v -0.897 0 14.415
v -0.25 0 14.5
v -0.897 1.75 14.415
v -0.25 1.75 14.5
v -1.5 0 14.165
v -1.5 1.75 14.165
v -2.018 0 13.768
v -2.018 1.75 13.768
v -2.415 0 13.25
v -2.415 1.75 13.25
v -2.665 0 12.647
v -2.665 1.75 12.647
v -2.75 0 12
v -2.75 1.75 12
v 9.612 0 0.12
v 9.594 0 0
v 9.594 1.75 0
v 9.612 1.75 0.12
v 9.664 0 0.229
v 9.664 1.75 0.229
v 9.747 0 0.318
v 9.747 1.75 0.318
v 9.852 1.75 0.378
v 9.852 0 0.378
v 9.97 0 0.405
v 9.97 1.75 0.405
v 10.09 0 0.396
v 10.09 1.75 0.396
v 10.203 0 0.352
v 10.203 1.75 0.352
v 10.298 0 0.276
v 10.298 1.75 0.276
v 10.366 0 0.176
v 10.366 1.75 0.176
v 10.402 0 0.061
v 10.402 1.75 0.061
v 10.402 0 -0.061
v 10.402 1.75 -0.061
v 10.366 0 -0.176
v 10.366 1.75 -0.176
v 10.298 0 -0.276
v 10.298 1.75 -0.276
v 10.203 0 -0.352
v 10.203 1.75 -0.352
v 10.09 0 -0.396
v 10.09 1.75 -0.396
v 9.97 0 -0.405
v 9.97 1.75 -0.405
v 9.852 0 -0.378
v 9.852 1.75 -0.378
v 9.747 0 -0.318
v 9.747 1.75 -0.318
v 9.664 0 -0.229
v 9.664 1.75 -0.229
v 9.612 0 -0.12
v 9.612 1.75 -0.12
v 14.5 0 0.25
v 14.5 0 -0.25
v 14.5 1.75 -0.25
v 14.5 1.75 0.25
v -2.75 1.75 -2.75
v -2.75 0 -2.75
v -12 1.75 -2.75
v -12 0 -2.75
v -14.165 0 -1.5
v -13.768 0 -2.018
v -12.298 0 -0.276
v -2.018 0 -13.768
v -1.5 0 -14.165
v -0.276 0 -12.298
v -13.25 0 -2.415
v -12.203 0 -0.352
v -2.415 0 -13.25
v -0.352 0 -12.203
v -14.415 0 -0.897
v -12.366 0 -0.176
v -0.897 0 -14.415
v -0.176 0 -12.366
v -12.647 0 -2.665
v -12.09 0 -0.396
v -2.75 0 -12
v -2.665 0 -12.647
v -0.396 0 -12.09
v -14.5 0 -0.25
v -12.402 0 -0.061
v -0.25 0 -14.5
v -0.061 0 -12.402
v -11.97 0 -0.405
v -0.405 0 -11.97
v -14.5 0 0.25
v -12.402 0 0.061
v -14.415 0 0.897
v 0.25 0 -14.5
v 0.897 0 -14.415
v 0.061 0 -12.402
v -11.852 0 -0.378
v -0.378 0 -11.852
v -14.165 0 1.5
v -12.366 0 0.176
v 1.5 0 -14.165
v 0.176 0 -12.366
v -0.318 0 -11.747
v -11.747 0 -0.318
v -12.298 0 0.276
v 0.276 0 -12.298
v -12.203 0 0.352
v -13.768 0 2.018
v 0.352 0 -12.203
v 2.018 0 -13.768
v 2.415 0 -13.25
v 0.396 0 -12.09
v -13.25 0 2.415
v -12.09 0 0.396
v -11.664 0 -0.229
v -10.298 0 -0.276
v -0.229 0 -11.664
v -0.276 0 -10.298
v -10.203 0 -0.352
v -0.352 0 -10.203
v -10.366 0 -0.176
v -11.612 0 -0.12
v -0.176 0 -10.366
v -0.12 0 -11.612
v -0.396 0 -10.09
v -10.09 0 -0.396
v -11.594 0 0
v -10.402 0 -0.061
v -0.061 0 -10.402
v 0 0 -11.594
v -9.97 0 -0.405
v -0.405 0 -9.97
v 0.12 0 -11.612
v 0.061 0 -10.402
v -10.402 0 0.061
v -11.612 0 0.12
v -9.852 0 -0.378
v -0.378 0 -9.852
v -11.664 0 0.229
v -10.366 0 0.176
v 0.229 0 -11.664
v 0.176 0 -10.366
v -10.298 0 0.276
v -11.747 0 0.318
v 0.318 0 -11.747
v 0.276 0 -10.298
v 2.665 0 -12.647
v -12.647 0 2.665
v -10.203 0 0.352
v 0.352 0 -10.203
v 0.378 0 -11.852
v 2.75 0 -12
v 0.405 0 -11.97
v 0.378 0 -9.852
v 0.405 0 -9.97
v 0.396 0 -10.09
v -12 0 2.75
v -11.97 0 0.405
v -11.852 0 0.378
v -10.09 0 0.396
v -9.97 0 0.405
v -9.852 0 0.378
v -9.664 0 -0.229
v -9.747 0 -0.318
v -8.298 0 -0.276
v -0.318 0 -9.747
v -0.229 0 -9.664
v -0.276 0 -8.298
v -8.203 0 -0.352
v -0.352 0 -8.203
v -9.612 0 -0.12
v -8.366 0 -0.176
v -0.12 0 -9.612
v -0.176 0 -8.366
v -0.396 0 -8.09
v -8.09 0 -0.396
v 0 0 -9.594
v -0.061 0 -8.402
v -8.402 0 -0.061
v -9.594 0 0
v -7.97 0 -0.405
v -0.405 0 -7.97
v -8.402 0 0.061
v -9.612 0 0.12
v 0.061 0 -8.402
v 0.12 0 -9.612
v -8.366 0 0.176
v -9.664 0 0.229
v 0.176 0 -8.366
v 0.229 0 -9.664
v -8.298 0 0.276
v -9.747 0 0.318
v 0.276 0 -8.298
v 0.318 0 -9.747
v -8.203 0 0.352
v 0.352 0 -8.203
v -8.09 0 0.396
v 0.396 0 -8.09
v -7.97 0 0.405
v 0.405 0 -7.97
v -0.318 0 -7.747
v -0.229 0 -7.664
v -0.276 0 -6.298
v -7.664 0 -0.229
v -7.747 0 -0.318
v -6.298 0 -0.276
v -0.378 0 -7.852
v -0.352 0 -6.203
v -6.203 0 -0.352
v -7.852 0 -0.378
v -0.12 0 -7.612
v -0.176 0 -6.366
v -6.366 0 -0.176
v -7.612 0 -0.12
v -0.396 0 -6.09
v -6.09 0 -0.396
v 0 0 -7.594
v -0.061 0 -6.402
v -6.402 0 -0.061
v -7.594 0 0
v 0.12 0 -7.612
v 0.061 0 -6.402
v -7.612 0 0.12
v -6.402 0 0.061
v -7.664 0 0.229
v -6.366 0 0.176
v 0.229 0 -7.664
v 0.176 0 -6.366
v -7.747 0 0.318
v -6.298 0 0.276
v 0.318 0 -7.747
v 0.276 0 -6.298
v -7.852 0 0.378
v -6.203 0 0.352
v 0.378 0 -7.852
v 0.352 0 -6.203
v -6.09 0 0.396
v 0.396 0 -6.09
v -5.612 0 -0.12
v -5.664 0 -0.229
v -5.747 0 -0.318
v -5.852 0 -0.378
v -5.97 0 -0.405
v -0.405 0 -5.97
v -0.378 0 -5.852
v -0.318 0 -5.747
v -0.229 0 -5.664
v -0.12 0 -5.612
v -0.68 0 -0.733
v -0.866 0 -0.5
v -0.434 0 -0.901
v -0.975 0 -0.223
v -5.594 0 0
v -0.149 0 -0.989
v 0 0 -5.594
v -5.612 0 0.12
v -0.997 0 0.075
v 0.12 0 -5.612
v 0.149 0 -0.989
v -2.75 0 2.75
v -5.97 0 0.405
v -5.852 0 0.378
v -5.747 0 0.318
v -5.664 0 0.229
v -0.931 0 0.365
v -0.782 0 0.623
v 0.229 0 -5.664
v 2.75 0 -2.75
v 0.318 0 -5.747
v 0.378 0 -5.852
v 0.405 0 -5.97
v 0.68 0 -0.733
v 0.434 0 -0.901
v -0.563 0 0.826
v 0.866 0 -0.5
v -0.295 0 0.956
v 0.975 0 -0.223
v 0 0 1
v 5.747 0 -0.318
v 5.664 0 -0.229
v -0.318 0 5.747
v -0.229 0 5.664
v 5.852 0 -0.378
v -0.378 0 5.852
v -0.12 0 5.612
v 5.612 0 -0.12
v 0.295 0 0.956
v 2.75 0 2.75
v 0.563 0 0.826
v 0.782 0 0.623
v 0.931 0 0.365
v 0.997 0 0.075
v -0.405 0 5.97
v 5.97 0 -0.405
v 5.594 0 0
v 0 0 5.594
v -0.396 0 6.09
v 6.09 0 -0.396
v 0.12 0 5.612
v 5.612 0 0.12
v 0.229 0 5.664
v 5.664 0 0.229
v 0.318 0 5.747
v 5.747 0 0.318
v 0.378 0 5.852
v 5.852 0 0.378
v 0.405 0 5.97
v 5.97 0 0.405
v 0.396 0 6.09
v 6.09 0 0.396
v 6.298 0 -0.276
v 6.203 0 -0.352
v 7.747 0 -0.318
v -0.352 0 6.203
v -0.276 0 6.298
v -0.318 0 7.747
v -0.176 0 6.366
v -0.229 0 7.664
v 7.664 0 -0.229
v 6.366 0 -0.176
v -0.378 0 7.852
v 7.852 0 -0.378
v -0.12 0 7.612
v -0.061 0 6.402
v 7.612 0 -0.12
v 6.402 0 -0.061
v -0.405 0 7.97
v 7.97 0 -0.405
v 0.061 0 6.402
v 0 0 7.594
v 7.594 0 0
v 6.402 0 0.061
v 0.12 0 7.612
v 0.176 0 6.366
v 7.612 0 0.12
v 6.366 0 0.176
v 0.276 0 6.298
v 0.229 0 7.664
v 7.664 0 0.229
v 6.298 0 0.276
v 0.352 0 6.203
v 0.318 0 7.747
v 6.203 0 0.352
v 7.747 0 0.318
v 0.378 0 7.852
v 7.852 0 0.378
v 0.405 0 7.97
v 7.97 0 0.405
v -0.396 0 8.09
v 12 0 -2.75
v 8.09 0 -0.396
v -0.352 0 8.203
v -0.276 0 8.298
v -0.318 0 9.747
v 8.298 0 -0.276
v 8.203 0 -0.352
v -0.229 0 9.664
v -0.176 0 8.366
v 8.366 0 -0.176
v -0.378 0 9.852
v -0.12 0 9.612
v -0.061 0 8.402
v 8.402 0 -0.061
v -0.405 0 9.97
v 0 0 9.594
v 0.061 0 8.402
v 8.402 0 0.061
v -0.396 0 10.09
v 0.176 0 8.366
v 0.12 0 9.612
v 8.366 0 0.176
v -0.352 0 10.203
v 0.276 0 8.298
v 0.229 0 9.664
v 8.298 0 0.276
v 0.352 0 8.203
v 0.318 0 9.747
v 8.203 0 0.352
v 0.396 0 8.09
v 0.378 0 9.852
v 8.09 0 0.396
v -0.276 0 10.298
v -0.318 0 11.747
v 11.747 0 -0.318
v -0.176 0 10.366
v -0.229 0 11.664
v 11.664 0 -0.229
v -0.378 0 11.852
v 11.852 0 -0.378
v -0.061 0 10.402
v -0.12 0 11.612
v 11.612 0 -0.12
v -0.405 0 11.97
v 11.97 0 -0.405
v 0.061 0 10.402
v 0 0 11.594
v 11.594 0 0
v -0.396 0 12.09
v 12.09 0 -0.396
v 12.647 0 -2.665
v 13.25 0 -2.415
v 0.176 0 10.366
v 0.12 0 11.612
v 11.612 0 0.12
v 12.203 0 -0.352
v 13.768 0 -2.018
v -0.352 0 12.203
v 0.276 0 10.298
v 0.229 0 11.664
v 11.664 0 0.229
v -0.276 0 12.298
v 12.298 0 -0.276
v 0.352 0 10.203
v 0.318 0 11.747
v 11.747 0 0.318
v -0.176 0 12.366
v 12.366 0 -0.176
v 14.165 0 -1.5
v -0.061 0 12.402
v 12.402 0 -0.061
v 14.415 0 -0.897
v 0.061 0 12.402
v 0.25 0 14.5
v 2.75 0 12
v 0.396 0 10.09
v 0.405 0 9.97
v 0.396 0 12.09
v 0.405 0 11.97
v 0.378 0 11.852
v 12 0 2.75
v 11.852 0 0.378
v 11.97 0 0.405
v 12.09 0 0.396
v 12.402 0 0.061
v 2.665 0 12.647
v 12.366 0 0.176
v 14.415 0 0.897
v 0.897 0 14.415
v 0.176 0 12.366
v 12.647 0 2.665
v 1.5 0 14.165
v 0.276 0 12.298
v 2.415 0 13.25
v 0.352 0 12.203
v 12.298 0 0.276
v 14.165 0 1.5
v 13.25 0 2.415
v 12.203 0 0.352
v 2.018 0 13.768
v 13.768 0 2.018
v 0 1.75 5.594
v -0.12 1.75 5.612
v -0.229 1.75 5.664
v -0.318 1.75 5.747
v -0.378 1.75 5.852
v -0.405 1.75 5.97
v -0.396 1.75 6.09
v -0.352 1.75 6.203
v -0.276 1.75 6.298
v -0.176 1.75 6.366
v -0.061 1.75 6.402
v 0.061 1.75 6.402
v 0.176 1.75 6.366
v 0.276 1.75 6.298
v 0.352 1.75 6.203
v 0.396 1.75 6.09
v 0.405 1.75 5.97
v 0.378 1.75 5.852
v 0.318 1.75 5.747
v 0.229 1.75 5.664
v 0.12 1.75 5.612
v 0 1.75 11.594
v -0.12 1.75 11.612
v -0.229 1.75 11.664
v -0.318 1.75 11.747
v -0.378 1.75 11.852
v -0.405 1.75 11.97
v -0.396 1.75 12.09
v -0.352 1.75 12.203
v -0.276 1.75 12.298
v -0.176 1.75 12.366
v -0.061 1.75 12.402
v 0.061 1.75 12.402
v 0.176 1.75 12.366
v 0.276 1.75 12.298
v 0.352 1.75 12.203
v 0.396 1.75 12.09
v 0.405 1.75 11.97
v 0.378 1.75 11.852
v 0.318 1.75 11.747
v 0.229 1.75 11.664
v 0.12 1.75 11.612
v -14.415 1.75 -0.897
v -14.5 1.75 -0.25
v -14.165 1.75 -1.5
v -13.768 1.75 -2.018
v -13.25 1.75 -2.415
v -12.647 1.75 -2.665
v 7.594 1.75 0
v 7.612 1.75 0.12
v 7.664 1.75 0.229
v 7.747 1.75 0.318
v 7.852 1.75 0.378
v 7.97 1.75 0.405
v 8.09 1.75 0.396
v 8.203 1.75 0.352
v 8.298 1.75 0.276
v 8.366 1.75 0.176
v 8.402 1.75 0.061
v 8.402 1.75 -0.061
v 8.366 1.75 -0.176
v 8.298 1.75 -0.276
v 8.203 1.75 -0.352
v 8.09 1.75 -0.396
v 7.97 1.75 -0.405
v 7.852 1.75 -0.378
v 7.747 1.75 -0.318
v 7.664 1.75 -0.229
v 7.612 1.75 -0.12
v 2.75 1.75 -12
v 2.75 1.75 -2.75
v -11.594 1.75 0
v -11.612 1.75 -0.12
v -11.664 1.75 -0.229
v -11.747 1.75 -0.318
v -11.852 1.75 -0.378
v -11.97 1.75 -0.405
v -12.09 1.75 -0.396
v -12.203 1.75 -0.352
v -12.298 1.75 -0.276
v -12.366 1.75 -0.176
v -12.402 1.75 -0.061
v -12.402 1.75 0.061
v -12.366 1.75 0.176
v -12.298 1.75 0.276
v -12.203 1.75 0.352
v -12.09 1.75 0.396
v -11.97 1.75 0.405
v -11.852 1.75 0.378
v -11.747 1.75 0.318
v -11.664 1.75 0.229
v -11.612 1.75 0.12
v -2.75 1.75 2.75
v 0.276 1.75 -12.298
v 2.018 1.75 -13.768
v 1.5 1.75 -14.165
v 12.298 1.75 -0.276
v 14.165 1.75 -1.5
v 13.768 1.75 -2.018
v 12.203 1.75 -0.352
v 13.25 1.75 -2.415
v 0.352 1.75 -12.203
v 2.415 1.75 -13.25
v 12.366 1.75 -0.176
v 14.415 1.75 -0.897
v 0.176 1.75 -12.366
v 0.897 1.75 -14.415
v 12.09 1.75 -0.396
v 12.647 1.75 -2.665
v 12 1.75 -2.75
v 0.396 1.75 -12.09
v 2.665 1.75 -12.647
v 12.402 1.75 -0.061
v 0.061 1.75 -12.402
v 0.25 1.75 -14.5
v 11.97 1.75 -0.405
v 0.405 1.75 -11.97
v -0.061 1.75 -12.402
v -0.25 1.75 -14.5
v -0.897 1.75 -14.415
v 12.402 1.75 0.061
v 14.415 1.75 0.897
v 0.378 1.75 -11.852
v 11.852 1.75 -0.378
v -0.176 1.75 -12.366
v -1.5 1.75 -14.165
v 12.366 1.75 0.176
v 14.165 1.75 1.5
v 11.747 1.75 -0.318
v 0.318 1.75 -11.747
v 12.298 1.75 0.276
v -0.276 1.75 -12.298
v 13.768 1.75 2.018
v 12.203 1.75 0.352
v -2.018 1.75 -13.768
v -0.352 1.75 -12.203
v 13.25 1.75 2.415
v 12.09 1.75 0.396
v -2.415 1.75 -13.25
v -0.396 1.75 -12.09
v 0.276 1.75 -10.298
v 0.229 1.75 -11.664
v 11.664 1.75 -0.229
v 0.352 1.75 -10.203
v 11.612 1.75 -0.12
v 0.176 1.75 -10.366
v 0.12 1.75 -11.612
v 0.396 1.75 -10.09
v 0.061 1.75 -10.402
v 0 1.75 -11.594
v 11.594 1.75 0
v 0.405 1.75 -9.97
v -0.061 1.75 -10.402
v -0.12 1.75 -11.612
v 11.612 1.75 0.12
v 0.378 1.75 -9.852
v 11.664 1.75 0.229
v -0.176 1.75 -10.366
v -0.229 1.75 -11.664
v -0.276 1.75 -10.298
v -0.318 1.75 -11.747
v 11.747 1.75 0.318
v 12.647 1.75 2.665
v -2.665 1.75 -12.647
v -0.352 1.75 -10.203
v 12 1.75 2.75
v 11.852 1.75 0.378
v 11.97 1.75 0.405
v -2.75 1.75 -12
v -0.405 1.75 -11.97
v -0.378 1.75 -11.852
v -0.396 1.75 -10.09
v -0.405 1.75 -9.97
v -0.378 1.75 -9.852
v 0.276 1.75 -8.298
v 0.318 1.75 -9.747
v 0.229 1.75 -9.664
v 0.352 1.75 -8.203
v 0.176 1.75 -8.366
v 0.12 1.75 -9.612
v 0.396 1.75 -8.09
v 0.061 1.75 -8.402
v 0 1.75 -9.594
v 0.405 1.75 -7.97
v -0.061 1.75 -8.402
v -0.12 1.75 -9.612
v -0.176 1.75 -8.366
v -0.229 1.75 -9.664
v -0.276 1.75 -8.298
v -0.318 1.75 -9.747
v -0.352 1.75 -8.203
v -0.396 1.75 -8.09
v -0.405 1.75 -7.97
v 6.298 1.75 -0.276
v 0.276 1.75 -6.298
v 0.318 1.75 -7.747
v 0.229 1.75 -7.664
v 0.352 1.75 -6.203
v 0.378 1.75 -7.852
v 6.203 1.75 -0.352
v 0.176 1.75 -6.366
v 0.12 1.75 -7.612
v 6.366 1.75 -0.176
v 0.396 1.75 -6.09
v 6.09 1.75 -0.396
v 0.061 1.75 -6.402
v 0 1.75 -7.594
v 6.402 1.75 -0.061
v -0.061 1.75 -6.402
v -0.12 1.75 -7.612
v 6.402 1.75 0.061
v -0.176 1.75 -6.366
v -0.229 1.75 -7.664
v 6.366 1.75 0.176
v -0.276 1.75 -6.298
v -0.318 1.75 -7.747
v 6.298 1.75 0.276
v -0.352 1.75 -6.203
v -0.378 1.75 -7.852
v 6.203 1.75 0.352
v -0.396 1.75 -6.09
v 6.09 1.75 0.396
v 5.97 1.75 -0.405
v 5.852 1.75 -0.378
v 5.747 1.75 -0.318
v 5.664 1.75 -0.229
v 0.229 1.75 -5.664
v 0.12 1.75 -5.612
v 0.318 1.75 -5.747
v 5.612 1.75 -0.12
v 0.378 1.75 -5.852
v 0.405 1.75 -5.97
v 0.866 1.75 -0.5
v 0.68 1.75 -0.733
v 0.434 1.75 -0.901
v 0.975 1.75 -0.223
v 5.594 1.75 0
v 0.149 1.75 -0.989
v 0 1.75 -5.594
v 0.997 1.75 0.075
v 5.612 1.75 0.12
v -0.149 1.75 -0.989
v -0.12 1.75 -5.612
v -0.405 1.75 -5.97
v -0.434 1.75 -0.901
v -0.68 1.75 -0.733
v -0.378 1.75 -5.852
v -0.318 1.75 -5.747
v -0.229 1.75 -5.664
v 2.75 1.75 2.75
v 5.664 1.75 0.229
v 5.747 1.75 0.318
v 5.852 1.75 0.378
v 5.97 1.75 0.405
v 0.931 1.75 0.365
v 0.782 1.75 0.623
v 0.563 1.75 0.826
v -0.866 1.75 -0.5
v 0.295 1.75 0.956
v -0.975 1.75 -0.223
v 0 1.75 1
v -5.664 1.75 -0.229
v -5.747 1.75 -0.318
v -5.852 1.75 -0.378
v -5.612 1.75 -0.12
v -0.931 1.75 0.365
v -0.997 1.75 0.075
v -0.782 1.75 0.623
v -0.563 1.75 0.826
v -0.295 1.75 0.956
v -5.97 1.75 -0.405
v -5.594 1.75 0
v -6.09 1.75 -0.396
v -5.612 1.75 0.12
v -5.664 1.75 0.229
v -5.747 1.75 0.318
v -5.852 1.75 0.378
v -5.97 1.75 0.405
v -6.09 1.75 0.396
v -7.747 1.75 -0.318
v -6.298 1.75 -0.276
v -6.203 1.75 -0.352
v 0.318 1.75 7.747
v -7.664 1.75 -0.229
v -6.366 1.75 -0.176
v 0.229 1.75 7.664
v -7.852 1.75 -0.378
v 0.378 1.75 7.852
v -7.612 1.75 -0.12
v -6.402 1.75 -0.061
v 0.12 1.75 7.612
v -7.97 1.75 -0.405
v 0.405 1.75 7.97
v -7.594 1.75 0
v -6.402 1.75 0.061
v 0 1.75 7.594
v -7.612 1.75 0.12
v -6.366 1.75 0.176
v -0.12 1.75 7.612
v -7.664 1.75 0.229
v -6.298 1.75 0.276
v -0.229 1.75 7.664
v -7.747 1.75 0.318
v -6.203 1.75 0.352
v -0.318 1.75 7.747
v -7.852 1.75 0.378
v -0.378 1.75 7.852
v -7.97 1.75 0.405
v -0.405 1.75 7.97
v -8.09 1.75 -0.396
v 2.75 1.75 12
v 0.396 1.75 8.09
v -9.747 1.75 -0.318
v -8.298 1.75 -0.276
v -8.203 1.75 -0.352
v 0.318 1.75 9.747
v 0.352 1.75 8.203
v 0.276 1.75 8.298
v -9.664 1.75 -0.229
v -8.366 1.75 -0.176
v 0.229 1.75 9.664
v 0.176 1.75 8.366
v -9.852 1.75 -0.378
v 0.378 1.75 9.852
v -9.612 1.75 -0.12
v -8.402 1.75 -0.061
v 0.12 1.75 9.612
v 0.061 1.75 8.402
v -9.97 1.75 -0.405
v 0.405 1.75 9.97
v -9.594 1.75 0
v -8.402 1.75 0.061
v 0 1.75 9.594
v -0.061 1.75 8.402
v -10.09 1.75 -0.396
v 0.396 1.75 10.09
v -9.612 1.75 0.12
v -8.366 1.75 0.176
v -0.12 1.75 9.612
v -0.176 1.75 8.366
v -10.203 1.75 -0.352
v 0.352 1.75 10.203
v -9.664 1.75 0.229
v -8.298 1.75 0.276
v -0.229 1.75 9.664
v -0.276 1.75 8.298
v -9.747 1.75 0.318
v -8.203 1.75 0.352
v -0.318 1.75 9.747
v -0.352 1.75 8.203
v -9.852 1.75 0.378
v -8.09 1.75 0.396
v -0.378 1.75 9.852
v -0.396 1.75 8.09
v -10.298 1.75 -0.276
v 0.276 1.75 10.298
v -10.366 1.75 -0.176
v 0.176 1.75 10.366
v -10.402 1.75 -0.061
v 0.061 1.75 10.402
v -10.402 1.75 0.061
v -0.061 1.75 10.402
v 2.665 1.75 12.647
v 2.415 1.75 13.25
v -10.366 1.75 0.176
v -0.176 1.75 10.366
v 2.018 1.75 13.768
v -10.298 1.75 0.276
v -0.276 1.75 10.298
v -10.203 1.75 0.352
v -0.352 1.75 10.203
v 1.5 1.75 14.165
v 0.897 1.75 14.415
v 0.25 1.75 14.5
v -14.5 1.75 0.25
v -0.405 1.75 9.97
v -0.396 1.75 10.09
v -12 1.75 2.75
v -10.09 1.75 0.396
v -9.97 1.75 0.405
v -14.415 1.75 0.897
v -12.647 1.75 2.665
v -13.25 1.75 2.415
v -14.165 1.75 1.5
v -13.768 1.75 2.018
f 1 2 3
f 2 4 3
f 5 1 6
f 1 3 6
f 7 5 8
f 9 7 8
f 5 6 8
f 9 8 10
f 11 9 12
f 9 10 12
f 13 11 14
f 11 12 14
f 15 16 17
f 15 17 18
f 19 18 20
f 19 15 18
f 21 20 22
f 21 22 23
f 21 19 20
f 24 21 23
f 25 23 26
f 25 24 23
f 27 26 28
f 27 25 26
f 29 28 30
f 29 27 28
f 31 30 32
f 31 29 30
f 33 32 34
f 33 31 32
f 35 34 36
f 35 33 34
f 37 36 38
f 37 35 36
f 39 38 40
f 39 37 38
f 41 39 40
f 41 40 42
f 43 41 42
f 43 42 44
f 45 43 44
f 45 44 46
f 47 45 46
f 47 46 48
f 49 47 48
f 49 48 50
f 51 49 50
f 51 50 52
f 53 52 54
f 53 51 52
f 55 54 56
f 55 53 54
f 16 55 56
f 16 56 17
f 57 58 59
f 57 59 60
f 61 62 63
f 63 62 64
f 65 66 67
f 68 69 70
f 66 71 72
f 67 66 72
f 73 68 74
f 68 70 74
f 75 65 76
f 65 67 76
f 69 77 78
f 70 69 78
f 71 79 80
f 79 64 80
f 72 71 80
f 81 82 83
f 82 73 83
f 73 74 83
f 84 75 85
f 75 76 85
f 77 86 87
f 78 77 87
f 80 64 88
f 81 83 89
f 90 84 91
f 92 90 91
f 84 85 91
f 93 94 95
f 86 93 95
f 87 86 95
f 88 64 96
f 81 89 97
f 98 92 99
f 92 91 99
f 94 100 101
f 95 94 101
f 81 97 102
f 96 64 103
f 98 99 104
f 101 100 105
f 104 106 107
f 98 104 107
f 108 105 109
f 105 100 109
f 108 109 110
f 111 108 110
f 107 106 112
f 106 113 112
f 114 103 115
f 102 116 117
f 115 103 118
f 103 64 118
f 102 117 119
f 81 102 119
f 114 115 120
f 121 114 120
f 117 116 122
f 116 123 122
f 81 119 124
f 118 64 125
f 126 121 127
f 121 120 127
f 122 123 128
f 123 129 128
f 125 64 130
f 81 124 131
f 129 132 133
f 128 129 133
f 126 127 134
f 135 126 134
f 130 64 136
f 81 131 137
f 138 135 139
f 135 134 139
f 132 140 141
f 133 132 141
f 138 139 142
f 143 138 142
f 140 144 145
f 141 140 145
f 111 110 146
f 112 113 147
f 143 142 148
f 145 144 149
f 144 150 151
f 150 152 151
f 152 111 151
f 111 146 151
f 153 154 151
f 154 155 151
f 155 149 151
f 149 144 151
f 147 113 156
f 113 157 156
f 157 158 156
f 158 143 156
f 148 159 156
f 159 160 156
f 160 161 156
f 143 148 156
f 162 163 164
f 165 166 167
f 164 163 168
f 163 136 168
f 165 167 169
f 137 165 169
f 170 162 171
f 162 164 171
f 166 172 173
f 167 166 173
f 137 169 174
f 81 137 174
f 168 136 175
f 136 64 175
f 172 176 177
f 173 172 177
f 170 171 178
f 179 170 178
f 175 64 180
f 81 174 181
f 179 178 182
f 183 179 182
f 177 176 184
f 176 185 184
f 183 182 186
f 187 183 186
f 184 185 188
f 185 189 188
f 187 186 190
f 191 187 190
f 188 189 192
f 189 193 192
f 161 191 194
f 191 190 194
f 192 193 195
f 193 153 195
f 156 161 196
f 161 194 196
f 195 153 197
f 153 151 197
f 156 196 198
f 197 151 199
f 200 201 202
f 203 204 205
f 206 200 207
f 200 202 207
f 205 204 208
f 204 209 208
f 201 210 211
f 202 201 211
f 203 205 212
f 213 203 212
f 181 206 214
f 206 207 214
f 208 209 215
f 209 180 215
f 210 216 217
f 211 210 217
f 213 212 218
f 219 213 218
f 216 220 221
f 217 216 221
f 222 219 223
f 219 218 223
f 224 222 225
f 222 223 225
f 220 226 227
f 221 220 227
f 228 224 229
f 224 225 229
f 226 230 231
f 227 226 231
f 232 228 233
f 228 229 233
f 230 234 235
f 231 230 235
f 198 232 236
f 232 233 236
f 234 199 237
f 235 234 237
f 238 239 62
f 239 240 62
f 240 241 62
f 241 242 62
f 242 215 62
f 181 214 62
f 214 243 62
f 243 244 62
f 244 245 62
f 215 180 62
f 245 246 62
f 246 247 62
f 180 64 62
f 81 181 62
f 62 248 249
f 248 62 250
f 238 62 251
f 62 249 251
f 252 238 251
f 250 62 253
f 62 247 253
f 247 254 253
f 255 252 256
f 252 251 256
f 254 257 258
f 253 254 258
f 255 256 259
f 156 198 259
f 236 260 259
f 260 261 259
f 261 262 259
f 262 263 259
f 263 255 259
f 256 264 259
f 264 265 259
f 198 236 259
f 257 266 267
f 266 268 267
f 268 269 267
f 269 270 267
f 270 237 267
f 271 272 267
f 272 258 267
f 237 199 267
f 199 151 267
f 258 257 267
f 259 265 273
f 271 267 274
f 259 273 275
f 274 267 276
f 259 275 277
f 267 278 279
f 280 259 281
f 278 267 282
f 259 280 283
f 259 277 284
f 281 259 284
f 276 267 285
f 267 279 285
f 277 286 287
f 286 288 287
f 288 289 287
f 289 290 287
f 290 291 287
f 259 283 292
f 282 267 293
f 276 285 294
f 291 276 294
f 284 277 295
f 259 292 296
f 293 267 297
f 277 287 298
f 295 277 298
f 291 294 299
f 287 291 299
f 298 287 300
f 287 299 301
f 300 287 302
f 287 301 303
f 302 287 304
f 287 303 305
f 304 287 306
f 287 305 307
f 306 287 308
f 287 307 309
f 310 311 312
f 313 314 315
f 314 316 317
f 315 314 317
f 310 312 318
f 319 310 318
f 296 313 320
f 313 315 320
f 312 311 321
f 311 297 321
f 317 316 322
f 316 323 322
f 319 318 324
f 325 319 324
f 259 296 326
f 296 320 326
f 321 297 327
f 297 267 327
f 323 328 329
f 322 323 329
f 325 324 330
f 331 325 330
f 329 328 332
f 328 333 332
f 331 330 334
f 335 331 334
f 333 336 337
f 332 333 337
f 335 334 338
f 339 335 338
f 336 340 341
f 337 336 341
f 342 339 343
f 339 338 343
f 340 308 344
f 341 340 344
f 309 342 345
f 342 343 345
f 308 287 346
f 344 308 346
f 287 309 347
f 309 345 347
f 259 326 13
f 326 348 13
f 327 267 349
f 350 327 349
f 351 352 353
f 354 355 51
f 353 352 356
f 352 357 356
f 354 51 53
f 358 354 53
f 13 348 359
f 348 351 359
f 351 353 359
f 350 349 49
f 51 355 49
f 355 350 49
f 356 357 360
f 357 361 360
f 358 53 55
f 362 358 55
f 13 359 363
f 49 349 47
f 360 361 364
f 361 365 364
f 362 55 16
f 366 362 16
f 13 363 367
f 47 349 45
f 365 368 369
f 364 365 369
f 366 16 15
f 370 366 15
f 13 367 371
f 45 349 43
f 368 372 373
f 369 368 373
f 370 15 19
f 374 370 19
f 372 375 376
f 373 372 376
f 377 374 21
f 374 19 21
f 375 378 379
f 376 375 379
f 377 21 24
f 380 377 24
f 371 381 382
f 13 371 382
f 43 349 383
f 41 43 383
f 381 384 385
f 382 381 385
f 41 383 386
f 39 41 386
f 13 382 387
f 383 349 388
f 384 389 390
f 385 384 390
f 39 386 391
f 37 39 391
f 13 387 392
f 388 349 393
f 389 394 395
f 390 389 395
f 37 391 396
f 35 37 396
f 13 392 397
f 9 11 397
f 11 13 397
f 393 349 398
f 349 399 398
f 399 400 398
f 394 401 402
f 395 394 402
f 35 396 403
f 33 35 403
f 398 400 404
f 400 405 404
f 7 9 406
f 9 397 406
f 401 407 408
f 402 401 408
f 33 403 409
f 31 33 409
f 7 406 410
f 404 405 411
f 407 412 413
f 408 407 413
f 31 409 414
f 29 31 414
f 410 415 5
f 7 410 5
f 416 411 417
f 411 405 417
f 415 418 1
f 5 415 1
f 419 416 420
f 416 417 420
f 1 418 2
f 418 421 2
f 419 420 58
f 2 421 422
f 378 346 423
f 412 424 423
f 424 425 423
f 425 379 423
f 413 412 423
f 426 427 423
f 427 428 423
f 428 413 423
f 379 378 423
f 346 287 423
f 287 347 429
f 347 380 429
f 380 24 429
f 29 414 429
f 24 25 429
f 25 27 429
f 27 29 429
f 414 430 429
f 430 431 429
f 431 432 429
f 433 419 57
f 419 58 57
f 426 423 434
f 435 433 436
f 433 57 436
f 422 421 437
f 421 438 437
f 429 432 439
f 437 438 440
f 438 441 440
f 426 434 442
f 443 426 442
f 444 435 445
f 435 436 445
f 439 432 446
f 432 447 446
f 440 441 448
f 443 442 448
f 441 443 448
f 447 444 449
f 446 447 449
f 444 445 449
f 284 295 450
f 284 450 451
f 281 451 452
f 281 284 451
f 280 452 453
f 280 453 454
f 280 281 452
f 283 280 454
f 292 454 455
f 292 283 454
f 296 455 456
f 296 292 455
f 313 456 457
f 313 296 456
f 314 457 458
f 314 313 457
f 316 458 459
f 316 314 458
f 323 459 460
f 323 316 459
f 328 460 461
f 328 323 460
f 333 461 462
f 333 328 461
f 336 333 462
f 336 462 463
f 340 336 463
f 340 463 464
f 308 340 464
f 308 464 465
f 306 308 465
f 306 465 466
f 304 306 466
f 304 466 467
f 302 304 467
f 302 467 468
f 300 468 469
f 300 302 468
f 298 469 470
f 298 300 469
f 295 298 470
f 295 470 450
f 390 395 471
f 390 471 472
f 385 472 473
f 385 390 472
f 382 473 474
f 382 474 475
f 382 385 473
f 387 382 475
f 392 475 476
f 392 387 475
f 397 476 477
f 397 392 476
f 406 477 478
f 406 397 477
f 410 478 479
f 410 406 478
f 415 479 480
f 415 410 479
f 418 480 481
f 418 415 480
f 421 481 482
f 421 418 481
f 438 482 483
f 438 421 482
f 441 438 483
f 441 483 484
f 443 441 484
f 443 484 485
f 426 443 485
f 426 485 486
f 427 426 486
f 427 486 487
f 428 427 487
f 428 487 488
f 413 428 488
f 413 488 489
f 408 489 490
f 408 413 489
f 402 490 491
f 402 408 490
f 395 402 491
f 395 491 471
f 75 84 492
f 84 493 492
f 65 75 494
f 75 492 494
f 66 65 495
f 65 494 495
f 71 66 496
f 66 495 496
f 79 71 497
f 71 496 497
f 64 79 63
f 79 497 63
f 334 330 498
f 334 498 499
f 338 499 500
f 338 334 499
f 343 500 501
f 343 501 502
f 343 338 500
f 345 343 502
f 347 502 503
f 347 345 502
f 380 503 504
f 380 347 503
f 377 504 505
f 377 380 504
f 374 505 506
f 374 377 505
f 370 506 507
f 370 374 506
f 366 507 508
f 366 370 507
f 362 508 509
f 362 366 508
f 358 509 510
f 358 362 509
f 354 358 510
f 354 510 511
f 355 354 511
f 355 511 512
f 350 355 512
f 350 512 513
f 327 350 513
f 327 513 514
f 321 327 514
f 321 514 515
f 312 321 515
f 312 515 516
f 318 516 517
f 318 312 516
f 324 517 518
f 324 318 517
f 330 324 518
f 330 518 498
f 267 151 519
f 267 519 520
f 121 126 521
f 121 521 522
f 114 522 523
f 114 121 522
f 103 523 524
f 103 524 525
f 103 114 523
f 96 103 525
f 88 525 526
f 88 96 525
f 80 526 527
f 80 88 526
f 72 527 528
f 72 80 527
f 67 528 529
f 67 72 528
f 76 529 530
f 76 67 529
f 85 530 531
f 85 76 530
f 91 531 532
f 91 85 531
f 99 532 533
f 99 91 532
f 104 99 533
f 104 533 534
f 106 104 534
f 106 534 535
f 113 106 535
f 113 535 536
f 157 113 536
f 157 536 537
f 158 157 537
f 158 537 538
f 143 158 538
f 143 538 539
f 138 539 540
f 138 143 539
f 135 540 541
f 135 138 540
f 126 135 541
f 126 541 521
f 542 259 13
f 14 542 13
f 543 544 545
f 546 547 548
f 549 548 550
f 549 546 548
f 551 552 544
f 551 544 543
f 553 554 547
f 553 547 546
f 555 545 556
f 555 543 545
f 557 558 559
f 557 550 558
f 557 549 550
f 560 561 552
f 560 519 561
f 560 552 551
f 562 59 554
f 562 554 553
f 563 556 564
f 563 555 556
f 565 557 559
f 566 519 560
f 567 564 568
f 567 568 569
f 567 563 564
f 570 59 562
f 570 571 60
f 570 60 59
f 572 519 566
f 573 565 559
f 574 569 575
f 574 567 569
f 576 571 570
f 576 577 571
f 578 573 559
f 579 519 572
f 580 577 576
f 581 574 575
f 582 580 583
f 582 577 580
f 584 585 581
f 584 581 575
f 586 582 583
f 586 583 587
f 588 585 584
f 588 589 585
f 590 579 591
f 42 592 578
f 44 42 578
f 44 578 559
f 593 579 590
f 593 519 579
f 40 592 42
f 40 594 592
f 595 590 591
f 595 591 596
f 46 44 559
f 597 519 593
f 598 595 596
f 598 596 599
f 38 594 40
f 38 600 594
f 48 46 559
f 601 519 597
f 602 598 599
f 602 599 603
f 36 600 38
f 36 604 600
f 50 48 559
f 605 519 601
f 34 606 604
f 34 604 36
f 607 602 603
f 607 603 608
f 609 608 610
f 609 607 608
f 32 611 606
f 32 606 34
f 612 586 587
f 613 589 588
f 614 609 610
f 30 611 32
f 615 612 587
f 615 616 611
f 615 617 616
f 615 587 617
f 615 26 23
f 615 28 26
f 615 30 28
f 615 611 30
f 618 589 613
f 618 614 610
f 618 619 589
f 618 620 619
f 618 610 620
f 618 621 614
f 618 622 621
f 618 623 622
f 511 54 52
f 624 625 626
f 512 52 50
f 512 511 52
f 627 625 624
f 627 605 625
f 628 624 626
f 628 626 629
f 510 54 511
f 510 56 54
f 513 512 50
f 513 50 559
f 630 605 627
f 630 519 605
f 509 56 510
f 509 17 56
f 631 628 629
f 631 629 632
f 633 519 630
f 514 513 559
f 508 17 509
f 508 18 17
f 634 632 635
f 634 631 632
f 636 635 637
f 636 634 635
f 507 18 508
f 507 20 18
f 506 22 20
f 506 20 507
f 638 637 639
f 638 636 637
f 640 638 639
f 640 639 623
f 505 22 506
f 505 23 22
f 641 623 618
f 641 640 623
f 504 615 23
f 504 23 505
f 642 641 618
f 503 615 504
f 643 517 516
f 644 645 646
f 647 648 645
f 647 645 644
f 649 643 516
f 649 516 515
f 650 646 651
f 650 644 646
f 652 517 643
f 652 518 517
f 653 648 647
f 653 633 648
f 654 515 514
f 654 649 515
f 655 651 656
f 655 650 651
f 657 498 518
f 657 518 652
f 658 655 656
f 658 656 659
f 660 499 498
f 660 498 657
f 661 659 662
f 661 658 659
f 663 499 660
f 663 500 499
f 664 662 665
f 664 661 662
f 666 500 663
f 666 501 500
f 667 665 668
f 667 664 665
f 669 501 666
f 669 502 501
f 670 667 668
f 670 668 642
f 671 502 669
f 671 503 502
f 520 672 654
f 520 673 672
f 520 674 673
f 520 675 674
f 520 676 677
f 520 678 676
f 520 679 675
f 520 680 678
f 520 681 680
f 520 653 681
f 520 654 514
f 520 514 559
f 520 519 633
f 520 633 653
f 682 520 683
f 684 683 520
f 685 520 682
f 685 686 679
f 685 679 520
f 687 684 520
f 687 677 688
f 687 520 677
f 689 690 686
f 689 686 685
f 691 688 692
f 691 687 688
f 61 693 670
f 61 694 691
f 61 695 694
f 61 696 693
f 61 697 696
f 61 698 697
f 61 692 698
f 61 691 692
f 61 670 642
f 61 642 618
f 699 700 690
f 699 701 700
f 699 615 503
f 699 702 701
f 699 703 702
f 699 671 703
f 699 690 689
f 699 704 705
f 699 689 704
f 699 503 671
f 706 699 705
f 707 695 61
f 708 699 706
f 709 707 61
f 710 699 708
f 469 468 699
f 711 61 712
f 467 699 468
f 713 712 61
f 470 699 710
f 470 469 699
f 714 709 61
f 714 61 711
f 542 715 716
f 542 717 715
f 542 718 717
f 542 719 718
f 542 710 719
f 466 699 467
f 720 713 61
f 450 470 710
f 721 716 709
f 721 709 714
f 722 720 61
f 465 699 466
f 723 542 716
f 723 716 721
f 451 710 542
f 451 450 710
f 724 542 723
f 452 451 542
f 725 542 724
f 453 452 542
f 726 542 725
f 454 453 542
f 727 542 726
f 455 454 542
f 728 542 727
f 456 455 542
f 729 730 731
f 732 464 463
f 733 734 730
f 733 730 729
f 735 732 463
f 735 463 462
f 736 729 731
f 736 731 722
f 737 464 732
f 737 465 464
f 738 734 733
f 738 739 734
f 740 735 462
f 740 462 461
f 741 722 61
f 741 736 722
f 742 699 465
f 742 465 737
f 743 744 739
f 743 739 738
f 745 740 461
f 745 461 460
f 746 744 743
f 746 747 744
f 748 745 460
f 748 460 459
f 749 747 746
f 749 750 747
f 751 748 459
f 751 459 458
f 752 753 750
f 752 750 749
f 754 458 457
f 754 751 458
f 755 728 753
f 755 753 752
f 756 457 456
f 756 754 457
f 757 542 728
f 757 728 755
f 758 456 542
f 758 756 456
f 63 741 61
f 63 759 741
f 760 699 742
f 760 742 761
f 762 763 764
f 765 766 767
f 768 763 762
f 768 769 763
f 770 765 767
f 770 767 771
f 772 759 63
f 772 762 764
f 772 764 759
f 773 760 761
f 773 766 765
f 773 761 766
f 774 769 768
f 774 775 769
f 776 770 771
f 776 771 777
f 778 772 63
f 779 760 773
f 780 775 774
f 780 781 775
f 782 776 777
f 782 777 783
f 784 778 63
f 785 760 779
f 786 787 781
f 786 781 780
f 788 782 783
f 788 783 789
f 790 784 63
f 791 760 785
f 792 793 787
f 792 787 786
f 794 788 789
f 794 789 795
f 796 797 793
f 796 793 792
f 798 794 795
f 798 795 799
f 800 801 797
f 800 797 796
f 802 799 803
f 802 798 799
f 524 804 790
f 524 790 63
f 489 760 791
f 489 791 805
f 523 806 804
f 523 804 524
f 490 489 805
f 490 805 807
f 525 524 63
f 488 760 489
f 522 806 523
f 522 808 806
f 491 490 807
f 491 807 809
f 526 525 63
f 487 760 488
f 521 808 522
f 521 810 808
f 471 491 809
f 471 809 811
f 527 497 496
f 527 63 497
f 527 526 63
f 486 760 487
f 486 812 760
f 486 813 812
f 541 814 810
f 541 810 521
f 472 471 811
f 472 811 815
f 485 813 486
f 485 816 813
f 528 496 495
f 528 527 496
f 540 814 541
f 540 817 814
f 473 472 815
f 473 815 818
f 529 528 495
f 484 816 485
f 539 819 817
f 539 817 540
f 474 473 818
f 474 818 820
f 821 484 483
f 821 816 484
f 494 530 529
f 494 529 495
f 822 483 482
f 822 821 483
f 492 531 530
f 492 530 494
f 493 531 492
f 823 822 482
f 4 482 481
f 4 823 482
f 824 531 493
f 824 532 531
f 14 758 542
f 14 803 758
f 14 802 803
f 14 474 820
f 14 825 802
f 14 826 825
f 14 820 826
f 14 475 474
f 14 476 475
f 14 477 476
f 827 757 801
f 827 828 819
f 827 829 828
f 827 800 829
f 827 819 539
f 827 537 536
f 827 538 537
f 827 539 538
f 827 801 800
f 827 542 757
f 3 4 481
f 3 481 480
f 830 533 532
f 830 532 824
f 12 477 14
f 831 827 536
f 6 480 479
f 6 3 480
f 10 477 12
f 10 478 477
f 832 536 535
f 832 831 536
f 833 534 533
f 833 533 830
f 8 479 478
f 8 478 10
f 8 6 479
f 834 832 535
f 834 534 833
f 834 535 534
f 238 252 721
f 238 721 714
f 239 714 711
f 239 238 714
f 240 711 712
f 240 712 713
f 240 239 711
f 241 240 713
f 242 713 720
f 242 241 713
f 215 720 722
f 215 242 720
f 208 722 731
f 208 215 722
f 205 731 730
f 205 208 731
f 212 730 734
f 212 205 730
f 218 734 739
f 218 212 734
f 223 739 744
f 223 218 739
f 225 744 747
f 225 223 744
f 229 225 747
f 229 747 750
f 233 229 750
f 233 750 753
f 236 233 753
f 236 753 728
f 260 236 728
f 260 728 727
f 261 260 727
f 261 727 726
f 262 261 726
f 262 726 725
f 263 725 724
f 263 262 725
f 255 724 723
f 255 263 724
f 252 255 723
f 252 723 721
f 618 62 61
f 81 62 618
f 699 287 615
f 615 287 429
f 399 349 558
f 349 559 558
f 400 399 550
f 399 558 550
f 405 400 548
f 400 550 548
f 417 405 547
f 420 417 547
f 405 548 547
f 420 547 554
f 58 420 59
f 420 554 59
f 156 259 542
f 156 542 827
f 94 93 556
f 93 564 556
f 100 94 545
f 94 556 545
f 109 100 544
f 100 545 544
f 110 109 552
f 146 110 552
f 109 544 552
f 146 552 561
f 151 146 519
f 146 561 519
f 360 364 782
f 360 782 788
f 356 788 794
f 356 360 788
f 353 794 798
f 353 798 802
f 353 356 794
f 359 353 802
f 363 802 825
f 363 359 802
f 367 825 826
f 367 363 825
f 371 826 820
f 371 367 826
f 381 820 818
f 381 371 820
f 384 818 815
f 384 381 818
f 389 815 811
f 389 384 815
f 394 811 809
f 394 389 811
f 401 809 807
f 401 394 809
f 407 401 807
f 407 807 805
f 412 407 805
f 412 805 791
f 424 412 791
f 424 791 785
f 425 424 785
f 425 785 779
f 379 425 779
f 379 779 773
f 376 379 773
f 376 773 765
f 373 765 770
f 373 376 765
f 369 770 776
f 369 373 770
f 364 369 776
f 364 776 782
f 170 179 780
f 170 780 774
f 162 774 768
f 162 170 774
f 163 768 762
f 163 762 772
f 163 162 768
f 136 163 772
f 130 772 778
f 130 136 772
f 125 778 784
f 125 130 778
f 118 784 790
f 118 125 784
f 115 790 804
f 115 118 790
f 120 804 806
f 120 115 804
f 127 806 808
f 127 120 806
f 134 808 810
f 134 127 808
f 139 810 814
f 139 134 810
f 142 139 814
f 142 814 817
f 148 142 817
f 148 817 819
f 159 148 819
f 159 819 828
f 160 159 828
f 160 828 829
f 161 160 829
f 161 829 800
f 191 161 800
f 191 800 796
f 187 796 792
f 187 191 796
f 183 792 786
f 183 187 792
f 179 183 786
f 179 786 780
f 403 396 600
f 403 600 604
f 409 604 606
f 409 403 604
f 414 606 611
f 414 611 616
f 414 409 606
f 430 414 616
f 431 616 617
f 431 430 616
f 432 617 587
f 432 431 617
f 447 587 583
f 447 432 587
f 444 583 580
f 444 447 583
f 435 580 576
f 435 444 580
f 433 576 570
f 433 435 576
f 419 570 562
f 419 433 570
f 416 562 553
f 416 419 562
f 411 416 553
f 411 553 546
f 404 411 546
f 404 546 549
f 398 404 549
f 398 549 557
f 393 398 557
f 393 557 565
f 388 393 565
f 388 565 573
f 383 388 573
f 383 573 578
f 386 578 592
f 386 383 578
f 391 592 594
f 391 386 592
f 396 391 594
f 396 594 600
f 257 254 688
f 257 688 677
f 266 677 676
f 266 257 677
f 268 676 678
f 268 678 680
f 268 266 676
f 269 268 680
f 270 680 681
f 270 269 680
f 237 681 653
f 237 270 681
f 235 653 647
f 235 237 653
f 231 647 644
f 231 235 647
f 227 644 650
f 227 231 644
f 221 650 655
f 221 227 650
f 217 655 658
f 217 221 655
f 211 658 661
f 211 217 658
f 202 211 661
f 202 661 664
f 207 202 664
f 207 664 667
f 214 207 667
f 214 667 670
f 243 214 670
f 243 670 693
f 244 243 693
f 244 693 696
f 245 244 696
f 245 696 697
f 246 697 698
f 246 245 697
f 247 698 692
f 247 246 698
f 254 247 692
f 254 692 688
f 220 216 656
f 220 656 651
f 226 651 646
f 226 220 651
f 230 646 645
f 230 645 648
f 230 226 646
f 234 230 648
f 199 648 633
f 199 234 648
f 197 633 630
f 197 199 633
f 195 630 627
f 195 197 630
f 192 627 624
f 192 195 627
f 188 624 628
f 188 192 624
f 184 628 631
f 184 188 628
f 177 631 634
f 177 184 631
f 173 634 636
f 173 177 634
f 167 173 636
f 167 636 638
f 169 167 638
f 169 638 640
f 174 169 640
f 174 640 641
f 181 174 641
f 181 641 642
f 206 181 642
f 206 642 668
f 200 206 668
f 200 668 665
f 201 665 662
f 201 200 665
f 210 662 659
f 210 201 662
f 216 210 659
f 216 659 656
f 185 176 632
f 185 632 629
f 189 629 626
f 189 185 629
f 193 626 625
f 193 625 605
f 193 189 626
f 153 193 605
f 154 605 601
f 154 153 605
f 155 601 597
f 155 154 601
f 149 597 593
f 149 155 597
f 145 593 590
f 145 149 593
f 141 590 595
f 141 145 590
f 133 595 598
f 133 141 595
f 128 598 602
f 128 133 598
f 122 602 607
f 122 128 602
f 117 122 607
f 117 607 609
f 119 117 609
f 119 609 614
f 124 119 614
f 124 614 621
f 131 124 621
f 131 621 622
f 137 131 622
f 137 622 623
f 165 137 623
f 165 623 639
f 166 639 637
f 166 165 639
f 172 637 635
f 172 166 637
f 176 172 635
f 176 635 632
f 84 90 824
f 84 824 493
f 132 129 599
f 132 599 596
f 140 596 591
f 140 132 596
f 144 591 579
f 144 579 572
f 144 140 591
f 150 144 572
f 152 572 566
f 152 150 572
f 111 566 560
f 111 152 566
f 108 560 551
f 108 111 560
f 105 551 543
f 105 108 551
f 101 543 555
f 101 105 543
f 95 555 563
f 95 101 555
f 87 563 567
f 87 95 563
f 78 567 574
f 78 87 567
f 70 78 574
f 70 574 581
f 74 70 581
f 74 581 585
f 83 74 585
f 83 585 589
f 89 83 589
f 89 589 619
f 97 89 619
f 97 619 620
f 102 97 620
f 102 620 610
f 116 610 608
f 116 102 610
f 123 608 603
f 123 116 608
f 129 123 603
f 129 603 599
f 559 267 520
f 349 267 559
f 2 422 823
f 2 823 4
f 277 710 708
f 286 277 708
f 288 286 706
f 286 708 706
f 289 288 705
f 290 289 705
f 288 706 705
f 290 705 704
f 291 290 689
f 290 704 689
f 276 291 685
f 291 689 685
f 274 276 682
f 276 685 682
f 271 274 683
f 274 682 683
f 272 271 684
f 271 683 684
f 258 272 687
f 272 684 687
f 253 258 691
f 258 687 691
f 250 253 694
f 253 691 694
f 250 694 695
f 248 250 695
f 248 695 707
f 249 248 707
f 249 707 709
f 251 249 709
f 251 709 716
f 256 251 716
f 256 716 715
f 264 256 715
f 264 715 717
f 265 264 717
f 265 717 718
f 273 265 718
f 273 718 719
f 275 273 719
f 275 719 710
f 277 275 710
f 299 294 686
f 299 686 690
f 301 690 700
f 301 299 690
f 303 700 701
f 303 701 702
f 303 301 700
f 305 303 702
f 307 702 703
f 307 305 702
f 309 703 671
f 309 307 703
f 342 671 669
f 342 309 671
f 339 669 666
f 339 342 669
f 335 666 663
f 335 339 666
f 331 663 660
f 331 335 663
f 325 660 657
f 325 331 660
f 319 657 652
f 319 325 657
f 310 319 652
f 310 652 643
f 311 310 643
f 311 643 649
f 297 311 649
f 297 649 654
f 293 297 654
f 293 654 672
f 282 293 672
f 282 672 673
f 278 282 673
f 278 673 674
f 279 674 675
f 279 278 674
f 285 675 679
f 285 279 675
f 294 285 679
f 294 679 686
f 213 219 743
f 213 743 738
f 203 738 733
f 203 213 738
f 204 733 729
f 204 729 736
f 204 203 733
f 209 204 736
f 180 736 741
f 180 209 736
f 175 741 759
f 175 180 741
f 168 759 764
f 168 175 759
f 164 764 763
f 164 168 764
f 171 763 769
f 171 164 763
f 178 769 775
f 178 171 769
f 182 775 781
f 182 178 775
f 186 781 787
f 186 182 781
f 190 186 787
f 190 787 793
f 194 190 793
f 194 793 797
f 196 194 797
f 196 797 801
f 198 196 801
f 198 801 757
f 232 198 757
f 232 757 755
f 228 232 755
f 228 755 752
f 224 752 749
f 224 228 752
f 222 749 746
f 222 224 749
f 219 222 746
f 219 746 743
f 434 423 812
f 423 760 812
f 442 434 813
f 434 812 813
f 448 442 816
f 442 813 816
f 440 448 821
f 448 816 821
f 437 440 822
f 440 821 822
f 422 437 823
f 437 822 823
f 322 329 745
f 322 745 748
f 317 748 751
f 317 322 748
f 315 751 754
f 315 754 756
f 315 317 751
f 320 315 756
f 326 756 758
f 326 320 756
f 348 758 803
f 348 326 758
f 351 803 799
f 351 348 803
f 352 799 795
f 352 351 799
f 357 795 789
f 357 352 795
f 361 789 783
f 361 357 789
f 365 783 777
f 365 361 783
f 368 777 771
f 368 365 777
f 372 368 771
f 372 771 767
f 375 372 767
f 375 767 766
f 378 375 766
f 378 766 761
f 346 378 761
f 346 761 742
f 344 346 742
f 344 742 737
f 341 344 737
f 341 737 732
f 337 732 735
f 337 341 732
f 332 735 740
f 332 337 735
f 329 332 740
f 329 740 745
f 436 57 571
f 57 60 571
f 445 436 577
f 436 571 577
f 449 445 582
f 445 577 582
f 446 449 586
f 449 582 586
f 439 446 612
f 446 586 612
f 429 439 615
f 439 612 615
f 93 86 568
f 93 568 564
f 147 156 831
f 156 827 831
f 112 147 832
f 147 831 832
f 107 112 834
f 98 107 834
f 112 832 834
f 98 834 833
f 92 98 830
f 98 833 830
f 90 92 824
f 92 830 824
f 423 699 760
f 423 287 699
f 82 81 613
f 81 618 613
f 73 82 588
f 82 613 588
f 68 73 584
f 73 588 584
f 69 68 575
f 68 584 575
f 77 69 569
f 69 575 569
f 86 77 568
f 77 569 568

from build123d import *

# Parameters (mm, degrees)
SKETCH1_W                = 5.5
SKETCH1_H                = 14.5
SKETCH1_R                = 0.4064
BOSS_EXTRUDE1_DEPTH      = 1.75
FILLET1_R                = 2.5
CIRPATTERN1_COUNT        = 4
FILLET1_OF_CIRPATTERN1_R = 2.5
CUT_EXTRUDE1_REACH       = 22.581
SKETCH2_R                = 1


with BuildPart() as part:
    # Sketch1 → Boss-Extrude1 (new body)
    with BuildSketch(Plane(origin=(0, 0, 0), x_dir=(1, 0, 0), z_dir=(0, 1, 0))):
        with Locations((0, 7.25)):
            Rectangle(SKETCH1_W, SKETCH1_H)
        with Locations((0, 12)):
            Circle(SKETCH1_R, mode=Mode.SUBTRACT)
        with Locations((0, 10)):
            Circle(SKETCH1_R, mode=Mode.SUBTRACT)
        with Locations((0, 8)):
            Circle(SKETCH1_R, mode=Mode.SUBTRACT)
        with Locations((0, 6)):
            Circle(SKETCH1_R, mode=Mode.SUBTRACT)
    boss_extrude1 = extrude(amount=BOSS_EXTRUDE1_DEPTH)

    # Fillet1
    fillet1_edges = [part.edges().sort_by_distance(p)[0] for p in [
        (-2.75, 0.875, -14.5),
        (2.75, 0.875, -14.5),
    ]]
    fillet(fillet1_edges, radius=FILLET1_R)

    # CirPattern1: Boss-Extrude1 ×4 about axis
    cirpattern1_axis = Axis((0, 0, 0), (0, 1, 0))
    for i in range(1, CIRPATTERN1_COUNT):
        add(boss_extrude1.rotate(cirpattern1_axis, i * 360 / CIRPATTERN1_COUNT))

    # Fillet1 of CirPattern1
    fillet1_of_cirpattern1_edges = [part.edges().sort_by_distance(p)[0] for p in [
        (-14.5, 0.875, 2.75),
        (-14.5, 0.875, -2.75),
        (2.75, 0.875, 14.5),
        (-2.75, 0.875, 14.5),
        (14.5, 0.875, -2.75),
        (14.5, 0.875, 2.75),
    ]]
    fillet(fillet1_of_cirpattern1_edges, radius=FILLET1_OF_CIRPATTERN1_R)

    # Sketch2 → Cut-Extrude1 (cut, up to next)
    with BuildSketch(Plane(origin=(0, 1.75, 0), x_dir=(1, 0, 0), z_dir=(0, 1, 0)), mode=Mode.PRIVATE) as cut_extrude1_sk1:
        Circle(SKETCH2_R)
    cut_extrude1_tool1 = extrude(cut_extrude1_sk1.sketch, amount=-CUT_EXTRUDE1_REACH, mode=Mode.PRIVATE) & part.part
    add(cut_extrude1_tool1.solids().sort_by_distance((0, 1.75, 0))[0], mode=Mode.SUBTRACT)


solid = part.part
